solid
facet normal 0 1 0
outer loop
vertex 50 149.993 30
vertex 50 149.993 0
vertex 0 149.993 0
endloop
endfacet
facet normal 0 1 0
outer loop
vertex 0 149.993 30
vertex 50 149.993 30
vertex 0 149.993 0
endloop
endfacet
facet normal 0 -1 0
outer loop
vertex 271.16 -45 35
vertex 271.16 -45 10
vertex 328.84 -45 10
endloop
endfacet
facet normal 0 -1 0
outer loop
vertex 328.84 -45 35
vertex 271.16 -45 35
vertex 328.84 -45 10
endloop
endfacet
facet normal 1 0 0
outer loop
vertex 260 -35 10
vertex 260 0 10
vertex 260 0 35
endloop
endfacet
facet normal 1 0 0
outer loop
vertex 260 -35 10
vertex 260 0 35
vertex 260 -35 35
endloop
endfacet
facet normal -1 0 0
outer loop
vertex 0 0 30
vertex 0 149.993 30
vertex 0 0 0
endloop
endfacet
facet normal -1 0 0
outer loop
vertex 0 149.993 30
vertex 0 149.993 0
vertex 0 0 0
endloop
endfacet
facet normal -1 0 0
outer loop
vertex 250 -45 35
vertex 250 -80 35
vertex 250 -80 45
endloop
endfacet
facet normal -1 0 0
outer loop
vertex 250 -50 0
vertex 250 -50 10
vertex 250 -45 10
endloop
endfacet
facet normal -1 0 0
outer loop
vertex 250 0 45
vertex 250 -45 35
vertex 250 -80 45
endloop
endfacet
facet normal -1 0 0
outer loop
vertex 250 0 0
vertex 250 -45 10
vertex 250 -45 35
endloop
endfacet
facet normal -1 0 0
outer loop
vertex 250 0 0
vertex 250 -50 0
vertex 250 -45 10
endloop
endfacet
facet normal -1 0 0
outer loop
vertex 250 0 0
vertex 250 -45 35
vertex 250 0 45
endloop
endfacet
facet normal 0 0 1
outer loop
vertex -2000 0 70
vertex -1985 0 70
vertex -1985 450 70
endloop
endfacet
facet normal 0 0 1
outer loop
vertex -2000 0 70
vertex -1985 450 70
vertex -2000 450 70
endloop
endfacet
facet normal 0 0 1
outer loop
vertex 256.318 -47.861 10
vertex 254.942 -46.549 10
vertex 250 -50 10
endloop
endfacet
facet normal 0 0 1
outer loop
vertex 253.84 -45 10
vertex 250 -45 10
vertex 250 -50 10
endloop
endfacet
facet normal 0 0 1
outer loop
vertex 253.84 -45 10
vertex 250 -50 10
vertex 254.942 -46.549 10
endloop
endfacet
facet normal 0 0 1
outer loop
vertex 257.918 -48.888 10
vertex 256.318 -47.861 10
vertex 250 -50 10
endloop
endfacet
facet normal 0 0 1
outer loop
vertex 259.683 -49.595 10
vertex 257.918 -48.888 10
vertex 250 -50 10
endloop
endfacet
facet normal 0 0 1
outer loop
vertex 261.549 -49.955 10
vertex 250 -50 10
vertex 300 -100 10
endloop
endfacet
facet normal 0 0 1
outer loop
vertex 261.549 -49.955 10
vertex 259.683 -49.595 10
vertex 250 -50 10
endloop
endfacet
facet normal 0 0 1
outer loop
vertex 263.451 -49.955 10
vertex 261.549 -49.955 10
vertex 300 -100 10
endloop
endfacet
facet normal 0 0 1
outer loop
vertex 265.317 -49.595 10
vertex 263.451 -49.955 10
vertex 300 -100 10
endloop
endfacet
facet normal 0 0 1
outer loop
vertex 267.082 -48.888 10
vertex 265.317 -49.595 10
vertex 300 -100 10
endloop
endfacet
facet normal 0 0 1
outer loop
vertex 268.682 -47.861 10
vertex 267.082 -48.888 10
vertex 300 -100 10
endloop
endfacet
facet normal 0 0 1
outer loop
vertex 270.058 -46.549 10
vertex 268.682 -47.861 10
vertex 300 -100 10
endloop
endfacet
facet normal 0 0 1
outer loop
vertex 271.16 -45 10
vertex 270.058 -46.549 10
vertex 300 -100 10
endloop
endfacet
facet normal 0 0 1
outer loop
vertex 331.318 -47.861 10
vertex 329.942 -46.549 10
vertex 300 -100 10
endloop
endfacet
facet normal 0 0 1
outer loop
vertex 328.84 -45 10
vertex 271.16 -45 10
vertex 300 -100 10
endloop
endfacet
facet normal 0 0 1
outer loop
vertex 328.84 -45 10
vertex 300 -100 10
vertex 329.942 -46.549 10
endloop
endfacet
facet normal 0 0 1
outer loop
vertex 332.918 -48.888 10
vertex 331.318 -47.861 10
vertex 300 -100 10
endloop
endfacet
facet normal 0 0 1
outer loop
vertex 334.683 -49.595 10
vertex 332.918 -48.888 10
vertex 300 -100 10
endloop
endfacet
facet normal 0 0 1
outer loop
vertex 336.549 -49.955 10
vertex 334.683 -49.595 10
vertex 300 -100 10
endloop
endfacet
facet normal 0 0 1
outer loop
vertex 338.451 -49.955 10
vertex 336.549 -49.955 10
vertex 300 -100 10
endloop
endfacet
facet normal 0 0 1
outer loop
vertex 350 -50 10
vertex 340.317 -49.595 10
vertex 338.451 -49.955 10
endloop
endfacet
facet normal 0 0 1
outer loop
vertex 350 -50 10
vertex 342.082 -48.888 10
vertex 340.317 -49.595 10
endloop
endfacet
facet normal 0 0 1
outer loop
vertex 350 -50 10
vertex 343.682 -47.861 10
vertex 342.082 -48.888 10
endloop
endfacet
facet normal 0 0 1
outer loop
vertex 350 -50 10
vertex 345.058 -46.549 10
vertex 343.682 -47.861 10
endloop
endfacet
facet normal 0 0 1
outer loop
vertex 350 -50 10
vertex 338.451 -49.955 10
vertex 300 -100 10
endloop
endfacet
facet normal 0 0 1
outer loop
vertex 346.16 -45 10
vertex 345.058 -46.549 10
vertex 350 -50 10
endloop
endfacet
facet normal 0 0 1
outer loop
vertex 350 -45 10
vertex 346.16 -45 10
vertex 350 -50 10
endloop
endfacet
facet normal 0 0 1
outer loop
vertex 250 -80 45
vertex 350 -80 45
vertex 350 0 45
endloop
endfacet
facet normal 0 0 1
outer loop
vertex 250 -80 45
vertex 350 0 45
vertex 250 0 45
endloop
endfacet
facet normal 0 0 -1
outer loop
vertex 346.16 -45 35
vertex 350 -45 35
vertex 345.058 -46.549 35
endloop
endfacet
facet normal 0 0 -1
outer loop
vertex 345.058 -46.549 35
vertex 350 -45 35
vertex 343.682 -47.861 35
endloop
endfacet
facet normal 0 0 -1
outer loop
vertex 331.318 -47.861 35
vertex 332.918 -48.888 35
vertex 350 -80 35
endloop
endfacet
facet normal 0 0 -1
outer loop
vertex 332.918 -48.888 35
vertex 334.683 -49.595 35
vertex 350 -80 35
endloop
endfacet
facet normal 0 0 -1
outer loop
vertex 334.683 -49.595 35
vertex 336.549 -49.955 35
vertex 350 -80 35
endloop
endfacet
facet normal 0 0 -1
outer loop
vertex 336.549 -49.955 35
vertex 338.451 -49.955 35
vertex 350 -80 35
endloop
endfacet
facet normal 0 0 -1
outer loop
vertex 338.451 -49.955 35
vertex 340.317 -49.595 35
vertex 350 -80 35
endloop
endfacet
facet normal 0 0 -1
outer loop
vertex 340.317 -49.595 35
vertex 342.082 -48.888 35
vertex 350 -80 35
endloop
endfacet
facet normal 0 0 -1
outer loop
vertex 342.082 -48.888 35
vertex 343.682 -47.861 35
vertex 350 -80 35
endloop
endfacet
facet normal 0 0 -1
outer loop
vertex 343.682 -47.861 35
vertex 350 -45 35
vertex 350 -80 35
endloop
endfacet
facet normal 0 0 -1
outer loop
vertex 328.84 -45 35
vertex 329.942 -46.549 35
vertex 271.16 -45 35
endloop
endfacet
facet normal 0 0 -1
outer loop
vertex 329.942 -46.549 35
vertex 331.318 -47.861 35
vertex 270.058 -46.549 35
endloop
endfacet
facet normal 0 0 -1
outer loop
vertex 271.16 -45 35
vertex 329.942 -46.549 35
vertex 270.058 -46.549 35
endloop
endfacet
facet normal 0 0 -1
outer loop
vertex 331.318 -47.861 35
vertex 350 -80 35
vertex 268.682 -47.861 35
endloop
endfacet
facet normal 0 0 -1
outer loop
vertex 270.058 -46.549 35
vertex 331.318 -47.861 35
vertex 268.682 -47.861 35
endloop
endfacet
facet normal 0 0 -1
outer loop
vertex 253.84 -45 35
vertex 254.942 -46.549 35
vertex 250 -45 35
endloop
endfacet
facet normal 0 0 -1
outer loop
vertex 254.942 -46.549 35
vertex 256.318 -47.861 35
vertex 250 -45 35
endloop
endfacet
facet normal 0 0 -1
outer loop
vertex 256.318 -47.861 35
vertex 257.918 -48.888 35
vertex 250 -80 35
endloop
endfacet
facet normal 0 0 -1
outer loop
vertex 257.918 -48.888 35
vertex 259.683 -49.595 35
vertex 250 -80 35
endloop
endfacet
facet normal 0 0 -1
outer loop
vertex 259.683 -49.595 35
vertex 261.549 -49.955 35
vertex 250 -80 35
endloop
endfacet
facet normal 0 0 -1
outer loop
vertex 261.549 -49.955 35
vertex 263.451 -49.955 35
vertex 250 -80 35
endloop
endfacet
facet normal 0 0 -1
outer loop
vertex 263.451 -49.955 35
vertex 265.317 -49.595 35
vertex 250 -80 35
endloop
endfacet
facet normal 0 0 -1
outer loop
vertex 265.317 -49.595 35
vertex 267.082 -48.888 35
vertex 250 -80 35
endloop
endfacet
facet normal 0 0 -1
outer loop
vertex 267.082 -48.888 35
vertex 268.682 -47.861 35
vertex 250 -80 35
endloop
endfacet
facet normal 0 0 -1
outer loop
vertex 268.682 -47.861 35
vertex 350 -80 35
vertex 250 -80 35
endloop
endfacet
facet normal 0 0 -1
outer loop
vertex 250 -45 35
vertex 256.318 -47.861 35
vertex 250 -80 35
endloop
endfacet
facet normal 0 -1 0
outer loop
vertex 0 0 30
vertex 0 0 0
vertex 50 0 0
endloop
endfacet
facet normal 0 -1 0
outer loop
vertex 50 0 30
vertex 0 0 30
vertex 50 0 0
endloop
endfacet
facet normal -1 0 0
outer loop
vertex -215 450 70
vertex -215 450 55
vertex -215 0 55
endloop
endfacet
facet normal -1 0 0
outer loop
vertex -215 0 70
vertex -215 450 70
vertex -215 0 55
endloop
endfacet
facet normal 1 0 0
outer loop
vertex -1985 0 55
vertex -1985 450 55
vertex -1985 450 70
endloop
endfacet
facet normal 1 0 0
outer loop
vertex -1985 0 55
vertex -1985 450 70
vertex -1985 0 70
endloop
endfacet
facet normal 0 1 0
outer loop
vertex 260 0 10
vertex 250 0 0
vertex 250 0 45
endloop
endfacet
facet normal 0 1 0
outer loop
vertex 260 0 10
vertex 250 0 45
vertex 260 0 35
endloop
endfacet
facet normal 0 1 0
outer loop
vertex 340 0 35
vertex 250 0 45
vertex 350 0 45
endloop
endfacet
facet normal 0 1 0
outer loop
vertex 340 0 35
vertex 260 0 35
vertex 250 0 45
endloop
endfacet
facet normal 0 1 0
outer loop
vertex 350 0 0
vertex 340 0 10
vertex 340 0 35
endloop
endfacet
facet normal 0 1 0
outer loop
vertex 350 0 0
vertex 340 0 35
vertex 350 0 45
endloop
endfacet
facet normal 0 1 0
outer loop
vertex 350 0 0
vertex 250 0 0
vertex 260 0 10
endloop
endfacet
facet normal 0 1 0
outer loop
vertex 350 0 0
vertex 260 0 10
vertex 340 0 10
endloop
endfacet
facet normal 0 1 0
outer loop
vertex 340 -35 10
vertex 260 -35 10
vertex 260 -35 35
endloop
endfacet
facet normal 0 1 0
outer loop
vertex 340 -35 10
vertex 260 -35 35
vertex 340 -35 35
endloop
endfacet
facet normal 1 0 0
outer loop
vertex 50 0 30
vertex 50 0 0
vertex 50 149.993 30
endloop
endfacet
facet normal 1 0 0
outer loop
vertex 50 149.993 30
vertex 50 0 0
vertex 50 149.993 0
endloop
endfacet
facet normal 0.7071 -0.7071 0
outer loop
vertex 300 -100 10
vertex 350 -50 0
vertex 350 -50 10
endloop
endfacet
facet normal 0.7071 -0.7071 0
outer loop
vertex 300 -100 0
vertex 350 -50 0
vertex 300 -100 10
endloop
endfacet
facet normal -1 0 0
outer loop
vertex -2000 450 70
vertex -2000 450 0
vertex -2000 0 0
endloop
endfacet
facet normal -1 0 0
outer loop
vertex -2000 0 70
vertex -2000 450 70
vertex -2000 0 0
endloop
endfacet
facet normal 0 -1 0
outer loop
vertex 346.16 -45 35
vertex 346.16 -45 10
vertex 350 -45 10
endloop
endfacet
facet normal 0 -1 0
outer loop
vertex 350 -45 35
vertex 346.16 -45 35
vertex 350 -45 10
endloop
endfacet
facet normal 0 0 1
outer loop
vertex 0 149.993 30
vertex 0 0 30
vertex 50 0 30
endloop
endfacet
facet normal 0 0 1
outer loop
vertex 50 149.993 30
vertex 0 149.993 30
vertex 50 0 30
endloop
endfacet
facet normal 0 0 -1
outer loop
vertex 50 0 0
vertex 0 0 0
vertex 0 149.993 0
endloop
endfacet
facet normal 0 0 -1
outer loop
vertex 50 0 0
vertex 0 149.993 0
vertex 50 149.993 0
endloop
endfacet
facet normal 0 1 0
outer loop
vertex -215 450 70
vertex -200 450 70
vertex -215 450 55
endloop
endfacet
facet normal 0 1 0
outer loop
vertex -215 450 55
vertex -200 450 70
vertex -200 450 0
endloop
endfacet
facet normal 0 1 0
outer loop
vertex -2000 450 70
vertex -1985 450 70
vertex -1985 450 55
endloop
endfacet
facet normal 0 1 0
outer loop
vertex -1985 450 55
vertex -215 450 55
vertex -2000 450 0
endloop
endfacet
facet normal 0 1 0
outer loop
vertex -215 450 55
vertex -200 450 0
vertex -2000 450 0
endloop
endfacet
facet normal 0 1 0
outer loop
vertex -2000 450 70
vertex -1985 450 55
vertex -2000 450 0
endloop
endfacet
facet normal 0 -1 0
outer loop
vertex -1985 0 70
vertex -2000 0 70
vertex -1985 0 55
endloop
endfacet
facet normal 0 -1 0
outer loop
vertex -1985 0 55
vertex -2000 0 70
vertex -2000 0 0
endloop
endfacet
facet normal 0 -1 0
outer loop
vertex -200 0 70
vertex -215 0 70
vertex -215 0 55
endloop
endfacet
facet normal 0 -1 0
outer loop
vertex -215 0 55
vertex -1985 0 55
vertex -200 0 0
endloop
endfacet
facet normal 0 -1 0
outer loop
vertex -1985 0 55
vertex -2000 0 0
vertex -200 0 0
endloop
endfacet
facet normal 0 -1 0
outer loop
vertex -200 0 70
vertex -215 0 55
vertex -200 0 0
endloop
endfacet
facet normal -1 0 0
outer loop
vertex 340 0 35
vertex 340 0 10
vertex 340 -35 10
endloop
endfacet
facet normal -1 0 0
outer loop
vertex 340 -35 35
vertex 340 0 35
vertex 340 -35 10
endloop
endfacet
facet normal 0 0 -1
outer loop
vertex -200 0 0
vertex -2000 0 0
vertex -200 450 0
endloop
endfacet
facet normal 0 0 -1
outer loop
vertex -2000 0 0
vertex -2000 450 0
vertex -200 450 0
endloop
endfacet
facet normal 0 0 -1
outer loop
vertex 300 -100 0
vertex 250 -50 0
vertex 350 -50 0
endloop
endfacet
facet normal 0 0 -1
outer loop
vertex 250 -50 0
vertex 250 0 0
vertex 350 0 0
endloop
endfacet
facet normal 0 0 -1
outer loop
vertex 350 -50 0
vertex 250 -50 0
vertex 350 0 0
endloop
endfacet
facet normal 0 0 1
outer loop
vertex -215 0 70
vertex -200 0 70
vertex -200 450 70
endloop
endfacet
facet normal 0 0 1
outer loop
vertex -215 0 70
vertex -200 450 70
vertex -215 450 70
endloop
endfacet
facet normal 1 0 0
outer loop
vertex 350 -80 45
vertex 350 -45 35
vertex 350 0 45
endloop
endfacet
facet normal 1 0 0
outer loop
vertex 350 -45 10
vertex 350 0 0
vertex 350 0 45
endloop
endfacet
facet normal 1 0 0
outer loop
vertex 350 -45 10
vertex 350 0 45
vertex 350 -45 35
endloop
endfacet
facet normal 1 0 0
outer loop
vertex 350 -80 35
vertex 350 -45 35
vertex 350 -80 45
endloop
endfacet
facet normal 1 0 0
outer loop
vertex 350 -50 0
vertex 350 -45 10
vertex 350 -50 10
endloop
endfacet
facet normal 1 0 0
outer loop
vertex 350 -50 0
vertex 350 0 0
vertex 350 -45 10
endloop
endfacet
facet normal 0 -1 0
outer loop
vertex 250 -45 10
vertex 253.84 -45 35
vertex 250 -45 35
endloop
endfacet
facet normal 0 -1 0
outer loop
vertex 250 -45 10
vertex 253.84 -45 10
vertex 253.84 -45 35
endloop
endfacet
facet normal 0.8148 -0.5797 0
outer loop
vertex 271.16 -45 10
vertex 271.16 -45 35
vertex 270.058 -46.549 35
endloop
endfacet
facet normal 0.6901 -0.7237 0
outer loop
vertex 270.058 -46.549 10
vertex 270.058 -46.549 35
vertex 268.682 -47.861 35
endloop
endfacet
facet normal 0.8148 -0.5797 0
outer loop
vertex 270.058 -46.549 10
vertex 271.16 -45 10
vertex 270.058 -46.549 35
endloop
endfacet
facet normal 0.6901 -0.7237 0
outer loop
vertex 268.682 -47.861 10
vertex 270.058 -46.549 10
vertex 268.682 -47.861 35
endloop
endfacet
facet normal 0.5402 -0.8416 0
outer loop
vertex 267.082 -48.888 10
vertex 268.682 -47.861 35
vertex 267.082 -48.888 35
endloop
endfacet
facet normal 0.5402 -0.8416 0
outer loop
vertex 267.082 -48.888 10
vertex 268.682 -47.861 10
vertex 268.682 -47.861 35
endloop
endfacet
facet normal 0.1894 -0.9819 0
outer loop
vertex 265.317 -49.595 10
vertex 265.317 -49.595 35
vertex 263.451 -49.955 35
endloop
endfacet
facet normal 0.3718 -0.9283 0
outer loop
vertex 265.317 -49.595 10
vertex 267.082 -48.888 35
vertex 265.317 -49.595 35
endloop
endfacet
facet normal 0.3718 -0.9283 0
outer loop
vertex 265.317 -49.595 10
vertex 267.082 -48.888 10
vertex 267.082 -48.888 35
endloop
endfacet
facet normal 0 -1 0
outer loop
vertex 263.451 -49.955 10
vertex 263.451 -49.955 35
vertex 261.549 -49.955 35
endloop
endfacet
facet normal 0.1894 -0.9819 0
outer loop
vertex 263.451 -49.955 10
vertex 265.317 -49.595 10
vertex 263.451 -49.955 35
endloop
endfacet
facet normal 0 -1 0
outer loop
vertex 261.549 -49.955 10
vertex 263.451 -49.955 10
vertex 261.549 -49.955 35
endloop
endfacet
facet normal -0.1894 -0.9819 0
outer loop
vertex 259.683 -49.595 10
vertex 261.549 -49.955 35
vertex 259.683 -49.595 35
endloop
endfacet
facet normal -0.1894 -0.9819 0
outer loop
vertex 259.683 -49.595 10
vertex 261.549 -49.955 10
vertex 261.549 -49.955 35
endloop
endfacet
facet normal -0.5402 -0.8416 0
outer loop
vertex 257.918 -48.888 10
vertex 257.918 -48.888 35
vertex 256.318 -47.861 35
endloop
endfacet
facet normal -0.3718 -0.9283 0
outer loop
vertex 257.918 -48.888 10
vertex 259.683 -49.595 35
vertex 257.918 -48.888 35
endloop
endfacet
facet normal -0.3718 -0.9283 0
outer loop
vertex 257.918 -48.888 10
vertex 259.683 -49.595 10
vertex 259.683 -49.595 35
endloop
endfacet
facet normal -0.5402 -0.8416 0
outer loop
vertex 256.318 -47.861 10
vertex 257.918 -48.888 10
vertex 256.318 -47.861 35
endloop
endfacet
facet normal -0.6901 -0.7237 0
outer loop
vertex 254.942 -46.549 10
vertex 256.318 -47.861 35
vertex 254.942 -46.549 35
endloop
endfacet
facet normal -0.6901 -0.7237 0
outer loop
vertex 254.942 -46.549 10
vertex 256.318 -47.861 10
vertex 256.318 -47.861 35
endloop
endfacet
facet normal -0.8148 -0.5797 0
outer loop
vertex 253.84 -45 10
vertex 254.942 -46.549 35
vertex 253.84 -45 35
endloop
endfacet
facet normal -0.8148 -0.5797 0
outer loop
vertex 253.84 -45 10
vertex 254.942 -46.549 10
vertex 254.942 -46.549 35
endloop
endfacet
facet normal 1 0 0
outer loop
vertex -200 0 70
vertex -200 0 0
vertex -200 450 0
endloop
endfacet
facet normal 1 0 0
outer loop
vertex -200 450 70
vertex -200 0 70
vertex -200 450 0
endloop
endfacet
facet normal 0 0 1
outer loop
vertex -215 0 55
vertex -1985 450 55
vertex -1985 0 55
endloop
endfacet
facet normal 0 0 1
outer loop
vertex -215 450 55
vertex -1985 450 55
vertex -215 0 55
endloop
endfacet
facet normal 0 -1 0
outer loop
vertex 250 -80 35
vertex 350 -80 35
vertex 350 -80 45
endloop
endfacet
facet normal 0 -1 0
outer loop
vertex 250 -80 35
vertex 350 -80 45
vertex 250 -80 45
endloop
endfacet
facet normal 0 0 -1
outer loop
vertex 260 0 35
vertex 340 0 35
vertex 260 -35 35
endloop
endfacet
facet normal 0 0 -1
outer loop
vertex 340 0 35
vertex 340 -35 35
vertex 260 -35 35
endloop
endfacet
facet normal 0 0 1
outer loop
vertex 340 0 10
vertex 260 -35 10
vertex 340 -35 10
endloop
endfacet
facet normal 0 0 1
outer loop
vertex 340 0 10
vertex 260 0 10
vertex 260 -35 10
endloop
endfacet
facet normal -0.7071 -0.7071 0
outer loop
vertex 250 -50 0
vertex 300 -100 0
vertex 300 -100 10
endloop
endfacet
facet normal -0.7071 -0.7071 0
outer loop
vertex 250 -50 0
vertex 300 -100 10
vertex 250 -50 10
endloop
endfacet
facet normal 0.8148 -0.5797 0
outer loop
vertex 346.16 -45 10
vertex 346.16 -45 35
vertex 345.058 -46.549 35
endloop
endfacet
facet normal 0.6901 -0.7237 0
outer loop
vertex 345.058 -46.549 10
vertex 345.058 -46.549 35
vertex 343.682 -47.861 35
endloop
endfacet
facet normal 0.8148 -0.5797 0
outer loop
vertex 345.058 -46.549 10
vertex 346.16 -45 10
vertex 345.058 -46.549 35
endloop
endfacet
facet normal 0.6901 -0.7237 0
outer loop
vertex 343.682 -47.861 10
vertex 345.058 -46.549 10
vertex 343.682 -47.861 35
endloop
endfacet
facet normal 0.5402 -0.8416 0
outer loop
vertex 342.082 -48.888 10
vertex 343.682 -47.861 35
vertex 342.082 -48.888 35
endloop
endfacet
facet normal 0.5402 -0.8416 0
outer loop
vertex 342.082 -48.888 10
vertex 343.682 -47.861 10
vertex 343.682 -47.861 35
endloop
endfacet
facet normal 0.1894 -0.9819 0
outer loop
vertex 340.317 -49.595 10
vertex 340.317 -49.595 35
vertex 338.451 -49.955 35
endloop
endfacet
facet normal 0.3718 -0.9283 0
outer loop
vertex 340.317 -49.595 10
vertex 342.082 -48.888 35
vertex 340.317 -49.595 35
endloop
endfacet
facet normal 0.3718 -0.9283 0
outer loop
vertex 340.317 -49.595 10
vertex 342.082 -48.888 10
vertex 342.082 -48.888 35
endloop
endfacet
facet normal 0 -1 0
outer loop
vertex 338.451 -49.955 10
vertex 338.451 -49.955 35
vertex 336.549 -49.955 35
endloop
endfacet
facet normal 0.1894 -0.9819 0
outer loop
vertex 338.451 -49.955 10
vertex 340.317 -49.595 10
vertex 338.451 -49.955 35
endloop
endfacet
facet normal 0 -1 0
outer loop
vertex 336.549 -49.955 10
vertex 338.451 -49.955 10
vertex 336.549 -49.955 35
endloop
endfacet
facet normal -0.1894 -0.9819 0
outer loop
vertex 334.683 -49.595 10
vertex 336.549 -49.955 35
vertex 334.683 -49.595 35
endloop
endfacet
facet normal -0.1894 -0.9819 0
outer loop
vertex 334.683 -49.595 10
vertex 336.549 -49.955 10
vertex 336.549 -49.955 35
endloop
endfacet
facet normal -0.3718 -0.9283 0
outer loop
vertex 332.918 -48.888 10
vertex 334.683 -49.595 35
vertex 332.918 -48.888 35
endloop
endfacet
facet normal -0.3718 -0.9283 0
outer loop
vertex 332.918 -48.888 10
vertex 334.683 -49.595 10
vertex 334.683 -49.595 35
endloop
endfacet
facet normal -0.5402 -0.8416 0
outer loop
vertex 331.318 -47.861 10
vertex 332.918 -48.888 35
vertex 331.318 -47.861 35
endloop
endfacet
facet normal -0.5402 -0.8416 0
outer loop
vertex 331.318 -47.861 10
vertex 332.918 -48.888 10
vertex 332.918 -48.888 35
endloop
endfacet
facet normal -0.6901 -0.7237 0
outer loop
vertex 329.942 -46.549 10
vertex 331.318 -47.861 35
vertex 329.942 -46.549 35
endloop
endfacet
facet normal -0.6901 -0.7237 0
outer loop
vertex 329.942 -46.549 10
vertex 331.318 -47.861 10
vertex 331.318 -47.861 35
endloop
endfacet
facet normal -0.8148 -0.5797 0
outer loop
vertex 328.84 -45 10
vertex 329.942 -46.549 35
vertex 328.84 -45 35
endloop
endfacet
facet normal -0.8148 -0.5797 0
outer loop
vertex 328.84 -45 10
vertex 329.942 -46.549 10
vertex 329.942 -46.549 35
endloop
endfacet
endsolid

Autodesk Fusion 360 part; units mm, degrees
sketch "Boceto1" plane through (0, 0, 0) normal (0, 0, 1) x (1, 0, 0)
  line L0 (0, 0) -> (50, 0)
  line L1 (50, 0) -> (50, 149.9932)
  line L2 (50, 149.9932) -> (0, 149.9932)
  line L3 (0, 149.9932) -> (0, 0)
  dimension "d1" = 50
extrude "Extruir1" add sketch "Boceto1" along normal blind 30 makes body 1
sketch "Boceto2" plane through (0, 0, 0) normal (0, 0, 1) x (1, 0, 0)
  line L0 (-200, 0) -> (-200, 450)
  line L1 (-200, 450) -> (-2000, 450)
  line L2 (-2000, 450) -> (-2000, 0)
  line L3 (-2000, 0) -> (-200, 0)
  dimension "d6" = 450
  dimension "d7" = 1800
extrude "Extruir2" add sketch "Boceto2" along normal blind 55 separate body makes body 2
sketch "Boceto3" plane through (0, 0, 0) normal (0, 0, 1) x (1, 0, 0)
  line L0 (250, 0) -> (350, 0)
  line L1 (350, 0) -> (350, -50)
  line L2 (250, -50) -> (250, 0)
  line L3 (350, 0) -> (250, 0)
  line L4 (250, 0) -> (250, -50)
  line L5 (250, -50) -> (350, -50)
  line L6 (350, -50) -> (350, 0)
  line L7 (350, -50) -> (300, -100)
  line L8 (300, -100) -> (250, -50)
  dimension "d10" = 100
  dimension "d12" = 50
extrude "Extruir3" add sketch "Boceto3" along normal blind 10 separate body makes body 3
sketch "Boceto4" plane through (0, 0, 10) normal (0, 0, 1) x (-1, 0, 0)
  line L0 (-350, 50) -> (-350, 0)
  line L1 (-350, 0) -> (-250, 0)
  line L2 (-250, 0) -> (-250, 50)
  line L3 (-250, 50) -> (-300, 100)
  line L4 (-300, 100) -> (-350, 50)
  line L5 (-250, 0) -> (-260, 0)
  line L6 (-260, 0) -> (-260, 45)
  line L7 (-260, 45) -> (-250, 45)
  line L8 (-250, 45) -> (-250, 0)
  line L9 (-350, 0) -> (-340, 0)
  line L10 (-340, 0) -> (-340, 45)
  line L11 (-340, 45) -> (-350, 45)
  line L12 (-350, 45) -> (-350, 0)
  line L13 (-337.5, 50) -> (-225, 50) construction
  line L14 (-260, 45) -> (-340, 45)
  line L15 (-260, 35) -> (-340, 35)
  line L16 (-262.5, 40) -> (-250, 40) construction
  line L17 (-337.5, 40) -> (-350, 40) construction
  arc A0 (-260, 30.3175) -> (-271.1603, 35) centre (-262.5, 40) ccw
  arc A1 (-328.8397, 35) -> (-340, 30.3175) centre (-337.5, 40) ccw
  dimension "d15" = 5
  dimension "d16" = 20
  dimension "d17" = 75
  dimension "d18" = 50
  dimension "d19" = 35
  dimension "d20" = 10
extrude "Extruir4" add sketch "Boceto4" along normal blind 25 contours L0 L1 L9 L10 L11 L12 A1 | L11 L14 A1 | L10 L11 A1 | L10 L14 L15 A1 | L14 L15 A0 A1 | L1 L2 L5 L6 L7 L8 A0 | L7 L14 A0 | L6 L14 L15 A0 | L6 L7 A0 bodies 3
sketch "Boceto5" plane through (0, 0, 35) normal (0, 0, 1) x (-1, 0, 0)
  arc A0 (-253.8397, 45) -> (-271.1603, 45) centre (-262.5, 40) ccw
  line L0 (-271.1603, 45) -> (-328.8397, 45)
  arc A1 (-328.8397, 45) -> (-346.1603, 45) centre (-337.5, 40) ccw
  line L1 (-346.1603, 45) -> (-350, 45)
  line L2 (-350, 45) -> (-350, 0)
  line L3 (-350, 0) -> (-340, 0)
  line L4 (-340, 0) -> (-340, 35)
  line L5 (-340, 35) -> (-260, 35)
  line L6 (-260, 35) -> (-260, 0)
  line L7 (-260, 0) -> (-250, 0)
  line L8 (-250, 0) -> (-250, 45)
  line L9 (-250, 45) -> (-253.8397, 45)
  line L10 (-250, 0) -> (-350, 0)
  line L11 (-350, 0) -> (-350, 80)
  line L12 (-350, 80) -> (-250, 80)
  line L13 (-250, 80) -> (-250, 0)
  dimension "d23" = 80
extrude "Extruir5" add sketch "Boceto5" along normal blind 10 bodies 3
sketch "Boceto6" plane through (0, 0, 55) normal (0, 0, 1) x (-1, 0, 0)
  line L0 (2000, 0) -> (200, 0)
  line L1 (200, 0) -> (200, -450)
  line L2 (200, -450) -> (2000, -450)
  line L3 (2000, -450) -> (2000, 0)
  line L4 (2000, -450) -> (1985, -450)
  line L5 (1985, -450) -> (1985, 0)
  line L6 (1985, 0) -> (2000, 0)
  line L7 (2000, 0) -> (2000, -450)
  line L8 (200, -450) -> (215, -450)
  line L9 (215, -450) -> (215, 0)
  line L10 (215, 0) -> (200, 0)
  line L11 (200, 0) -> (200, -450)
  dimension "d26" = 15
  dimension "d27" = 15
extrude "Extruir6" add sketch "Boceto6" along normal blind 15 contours L0 L2 L3 L4 L5 L6 L7 | L0 L1 L2 L8 L9 L10 L11 bodies 2
equation "d28 = 70 mm - 55 mm"
